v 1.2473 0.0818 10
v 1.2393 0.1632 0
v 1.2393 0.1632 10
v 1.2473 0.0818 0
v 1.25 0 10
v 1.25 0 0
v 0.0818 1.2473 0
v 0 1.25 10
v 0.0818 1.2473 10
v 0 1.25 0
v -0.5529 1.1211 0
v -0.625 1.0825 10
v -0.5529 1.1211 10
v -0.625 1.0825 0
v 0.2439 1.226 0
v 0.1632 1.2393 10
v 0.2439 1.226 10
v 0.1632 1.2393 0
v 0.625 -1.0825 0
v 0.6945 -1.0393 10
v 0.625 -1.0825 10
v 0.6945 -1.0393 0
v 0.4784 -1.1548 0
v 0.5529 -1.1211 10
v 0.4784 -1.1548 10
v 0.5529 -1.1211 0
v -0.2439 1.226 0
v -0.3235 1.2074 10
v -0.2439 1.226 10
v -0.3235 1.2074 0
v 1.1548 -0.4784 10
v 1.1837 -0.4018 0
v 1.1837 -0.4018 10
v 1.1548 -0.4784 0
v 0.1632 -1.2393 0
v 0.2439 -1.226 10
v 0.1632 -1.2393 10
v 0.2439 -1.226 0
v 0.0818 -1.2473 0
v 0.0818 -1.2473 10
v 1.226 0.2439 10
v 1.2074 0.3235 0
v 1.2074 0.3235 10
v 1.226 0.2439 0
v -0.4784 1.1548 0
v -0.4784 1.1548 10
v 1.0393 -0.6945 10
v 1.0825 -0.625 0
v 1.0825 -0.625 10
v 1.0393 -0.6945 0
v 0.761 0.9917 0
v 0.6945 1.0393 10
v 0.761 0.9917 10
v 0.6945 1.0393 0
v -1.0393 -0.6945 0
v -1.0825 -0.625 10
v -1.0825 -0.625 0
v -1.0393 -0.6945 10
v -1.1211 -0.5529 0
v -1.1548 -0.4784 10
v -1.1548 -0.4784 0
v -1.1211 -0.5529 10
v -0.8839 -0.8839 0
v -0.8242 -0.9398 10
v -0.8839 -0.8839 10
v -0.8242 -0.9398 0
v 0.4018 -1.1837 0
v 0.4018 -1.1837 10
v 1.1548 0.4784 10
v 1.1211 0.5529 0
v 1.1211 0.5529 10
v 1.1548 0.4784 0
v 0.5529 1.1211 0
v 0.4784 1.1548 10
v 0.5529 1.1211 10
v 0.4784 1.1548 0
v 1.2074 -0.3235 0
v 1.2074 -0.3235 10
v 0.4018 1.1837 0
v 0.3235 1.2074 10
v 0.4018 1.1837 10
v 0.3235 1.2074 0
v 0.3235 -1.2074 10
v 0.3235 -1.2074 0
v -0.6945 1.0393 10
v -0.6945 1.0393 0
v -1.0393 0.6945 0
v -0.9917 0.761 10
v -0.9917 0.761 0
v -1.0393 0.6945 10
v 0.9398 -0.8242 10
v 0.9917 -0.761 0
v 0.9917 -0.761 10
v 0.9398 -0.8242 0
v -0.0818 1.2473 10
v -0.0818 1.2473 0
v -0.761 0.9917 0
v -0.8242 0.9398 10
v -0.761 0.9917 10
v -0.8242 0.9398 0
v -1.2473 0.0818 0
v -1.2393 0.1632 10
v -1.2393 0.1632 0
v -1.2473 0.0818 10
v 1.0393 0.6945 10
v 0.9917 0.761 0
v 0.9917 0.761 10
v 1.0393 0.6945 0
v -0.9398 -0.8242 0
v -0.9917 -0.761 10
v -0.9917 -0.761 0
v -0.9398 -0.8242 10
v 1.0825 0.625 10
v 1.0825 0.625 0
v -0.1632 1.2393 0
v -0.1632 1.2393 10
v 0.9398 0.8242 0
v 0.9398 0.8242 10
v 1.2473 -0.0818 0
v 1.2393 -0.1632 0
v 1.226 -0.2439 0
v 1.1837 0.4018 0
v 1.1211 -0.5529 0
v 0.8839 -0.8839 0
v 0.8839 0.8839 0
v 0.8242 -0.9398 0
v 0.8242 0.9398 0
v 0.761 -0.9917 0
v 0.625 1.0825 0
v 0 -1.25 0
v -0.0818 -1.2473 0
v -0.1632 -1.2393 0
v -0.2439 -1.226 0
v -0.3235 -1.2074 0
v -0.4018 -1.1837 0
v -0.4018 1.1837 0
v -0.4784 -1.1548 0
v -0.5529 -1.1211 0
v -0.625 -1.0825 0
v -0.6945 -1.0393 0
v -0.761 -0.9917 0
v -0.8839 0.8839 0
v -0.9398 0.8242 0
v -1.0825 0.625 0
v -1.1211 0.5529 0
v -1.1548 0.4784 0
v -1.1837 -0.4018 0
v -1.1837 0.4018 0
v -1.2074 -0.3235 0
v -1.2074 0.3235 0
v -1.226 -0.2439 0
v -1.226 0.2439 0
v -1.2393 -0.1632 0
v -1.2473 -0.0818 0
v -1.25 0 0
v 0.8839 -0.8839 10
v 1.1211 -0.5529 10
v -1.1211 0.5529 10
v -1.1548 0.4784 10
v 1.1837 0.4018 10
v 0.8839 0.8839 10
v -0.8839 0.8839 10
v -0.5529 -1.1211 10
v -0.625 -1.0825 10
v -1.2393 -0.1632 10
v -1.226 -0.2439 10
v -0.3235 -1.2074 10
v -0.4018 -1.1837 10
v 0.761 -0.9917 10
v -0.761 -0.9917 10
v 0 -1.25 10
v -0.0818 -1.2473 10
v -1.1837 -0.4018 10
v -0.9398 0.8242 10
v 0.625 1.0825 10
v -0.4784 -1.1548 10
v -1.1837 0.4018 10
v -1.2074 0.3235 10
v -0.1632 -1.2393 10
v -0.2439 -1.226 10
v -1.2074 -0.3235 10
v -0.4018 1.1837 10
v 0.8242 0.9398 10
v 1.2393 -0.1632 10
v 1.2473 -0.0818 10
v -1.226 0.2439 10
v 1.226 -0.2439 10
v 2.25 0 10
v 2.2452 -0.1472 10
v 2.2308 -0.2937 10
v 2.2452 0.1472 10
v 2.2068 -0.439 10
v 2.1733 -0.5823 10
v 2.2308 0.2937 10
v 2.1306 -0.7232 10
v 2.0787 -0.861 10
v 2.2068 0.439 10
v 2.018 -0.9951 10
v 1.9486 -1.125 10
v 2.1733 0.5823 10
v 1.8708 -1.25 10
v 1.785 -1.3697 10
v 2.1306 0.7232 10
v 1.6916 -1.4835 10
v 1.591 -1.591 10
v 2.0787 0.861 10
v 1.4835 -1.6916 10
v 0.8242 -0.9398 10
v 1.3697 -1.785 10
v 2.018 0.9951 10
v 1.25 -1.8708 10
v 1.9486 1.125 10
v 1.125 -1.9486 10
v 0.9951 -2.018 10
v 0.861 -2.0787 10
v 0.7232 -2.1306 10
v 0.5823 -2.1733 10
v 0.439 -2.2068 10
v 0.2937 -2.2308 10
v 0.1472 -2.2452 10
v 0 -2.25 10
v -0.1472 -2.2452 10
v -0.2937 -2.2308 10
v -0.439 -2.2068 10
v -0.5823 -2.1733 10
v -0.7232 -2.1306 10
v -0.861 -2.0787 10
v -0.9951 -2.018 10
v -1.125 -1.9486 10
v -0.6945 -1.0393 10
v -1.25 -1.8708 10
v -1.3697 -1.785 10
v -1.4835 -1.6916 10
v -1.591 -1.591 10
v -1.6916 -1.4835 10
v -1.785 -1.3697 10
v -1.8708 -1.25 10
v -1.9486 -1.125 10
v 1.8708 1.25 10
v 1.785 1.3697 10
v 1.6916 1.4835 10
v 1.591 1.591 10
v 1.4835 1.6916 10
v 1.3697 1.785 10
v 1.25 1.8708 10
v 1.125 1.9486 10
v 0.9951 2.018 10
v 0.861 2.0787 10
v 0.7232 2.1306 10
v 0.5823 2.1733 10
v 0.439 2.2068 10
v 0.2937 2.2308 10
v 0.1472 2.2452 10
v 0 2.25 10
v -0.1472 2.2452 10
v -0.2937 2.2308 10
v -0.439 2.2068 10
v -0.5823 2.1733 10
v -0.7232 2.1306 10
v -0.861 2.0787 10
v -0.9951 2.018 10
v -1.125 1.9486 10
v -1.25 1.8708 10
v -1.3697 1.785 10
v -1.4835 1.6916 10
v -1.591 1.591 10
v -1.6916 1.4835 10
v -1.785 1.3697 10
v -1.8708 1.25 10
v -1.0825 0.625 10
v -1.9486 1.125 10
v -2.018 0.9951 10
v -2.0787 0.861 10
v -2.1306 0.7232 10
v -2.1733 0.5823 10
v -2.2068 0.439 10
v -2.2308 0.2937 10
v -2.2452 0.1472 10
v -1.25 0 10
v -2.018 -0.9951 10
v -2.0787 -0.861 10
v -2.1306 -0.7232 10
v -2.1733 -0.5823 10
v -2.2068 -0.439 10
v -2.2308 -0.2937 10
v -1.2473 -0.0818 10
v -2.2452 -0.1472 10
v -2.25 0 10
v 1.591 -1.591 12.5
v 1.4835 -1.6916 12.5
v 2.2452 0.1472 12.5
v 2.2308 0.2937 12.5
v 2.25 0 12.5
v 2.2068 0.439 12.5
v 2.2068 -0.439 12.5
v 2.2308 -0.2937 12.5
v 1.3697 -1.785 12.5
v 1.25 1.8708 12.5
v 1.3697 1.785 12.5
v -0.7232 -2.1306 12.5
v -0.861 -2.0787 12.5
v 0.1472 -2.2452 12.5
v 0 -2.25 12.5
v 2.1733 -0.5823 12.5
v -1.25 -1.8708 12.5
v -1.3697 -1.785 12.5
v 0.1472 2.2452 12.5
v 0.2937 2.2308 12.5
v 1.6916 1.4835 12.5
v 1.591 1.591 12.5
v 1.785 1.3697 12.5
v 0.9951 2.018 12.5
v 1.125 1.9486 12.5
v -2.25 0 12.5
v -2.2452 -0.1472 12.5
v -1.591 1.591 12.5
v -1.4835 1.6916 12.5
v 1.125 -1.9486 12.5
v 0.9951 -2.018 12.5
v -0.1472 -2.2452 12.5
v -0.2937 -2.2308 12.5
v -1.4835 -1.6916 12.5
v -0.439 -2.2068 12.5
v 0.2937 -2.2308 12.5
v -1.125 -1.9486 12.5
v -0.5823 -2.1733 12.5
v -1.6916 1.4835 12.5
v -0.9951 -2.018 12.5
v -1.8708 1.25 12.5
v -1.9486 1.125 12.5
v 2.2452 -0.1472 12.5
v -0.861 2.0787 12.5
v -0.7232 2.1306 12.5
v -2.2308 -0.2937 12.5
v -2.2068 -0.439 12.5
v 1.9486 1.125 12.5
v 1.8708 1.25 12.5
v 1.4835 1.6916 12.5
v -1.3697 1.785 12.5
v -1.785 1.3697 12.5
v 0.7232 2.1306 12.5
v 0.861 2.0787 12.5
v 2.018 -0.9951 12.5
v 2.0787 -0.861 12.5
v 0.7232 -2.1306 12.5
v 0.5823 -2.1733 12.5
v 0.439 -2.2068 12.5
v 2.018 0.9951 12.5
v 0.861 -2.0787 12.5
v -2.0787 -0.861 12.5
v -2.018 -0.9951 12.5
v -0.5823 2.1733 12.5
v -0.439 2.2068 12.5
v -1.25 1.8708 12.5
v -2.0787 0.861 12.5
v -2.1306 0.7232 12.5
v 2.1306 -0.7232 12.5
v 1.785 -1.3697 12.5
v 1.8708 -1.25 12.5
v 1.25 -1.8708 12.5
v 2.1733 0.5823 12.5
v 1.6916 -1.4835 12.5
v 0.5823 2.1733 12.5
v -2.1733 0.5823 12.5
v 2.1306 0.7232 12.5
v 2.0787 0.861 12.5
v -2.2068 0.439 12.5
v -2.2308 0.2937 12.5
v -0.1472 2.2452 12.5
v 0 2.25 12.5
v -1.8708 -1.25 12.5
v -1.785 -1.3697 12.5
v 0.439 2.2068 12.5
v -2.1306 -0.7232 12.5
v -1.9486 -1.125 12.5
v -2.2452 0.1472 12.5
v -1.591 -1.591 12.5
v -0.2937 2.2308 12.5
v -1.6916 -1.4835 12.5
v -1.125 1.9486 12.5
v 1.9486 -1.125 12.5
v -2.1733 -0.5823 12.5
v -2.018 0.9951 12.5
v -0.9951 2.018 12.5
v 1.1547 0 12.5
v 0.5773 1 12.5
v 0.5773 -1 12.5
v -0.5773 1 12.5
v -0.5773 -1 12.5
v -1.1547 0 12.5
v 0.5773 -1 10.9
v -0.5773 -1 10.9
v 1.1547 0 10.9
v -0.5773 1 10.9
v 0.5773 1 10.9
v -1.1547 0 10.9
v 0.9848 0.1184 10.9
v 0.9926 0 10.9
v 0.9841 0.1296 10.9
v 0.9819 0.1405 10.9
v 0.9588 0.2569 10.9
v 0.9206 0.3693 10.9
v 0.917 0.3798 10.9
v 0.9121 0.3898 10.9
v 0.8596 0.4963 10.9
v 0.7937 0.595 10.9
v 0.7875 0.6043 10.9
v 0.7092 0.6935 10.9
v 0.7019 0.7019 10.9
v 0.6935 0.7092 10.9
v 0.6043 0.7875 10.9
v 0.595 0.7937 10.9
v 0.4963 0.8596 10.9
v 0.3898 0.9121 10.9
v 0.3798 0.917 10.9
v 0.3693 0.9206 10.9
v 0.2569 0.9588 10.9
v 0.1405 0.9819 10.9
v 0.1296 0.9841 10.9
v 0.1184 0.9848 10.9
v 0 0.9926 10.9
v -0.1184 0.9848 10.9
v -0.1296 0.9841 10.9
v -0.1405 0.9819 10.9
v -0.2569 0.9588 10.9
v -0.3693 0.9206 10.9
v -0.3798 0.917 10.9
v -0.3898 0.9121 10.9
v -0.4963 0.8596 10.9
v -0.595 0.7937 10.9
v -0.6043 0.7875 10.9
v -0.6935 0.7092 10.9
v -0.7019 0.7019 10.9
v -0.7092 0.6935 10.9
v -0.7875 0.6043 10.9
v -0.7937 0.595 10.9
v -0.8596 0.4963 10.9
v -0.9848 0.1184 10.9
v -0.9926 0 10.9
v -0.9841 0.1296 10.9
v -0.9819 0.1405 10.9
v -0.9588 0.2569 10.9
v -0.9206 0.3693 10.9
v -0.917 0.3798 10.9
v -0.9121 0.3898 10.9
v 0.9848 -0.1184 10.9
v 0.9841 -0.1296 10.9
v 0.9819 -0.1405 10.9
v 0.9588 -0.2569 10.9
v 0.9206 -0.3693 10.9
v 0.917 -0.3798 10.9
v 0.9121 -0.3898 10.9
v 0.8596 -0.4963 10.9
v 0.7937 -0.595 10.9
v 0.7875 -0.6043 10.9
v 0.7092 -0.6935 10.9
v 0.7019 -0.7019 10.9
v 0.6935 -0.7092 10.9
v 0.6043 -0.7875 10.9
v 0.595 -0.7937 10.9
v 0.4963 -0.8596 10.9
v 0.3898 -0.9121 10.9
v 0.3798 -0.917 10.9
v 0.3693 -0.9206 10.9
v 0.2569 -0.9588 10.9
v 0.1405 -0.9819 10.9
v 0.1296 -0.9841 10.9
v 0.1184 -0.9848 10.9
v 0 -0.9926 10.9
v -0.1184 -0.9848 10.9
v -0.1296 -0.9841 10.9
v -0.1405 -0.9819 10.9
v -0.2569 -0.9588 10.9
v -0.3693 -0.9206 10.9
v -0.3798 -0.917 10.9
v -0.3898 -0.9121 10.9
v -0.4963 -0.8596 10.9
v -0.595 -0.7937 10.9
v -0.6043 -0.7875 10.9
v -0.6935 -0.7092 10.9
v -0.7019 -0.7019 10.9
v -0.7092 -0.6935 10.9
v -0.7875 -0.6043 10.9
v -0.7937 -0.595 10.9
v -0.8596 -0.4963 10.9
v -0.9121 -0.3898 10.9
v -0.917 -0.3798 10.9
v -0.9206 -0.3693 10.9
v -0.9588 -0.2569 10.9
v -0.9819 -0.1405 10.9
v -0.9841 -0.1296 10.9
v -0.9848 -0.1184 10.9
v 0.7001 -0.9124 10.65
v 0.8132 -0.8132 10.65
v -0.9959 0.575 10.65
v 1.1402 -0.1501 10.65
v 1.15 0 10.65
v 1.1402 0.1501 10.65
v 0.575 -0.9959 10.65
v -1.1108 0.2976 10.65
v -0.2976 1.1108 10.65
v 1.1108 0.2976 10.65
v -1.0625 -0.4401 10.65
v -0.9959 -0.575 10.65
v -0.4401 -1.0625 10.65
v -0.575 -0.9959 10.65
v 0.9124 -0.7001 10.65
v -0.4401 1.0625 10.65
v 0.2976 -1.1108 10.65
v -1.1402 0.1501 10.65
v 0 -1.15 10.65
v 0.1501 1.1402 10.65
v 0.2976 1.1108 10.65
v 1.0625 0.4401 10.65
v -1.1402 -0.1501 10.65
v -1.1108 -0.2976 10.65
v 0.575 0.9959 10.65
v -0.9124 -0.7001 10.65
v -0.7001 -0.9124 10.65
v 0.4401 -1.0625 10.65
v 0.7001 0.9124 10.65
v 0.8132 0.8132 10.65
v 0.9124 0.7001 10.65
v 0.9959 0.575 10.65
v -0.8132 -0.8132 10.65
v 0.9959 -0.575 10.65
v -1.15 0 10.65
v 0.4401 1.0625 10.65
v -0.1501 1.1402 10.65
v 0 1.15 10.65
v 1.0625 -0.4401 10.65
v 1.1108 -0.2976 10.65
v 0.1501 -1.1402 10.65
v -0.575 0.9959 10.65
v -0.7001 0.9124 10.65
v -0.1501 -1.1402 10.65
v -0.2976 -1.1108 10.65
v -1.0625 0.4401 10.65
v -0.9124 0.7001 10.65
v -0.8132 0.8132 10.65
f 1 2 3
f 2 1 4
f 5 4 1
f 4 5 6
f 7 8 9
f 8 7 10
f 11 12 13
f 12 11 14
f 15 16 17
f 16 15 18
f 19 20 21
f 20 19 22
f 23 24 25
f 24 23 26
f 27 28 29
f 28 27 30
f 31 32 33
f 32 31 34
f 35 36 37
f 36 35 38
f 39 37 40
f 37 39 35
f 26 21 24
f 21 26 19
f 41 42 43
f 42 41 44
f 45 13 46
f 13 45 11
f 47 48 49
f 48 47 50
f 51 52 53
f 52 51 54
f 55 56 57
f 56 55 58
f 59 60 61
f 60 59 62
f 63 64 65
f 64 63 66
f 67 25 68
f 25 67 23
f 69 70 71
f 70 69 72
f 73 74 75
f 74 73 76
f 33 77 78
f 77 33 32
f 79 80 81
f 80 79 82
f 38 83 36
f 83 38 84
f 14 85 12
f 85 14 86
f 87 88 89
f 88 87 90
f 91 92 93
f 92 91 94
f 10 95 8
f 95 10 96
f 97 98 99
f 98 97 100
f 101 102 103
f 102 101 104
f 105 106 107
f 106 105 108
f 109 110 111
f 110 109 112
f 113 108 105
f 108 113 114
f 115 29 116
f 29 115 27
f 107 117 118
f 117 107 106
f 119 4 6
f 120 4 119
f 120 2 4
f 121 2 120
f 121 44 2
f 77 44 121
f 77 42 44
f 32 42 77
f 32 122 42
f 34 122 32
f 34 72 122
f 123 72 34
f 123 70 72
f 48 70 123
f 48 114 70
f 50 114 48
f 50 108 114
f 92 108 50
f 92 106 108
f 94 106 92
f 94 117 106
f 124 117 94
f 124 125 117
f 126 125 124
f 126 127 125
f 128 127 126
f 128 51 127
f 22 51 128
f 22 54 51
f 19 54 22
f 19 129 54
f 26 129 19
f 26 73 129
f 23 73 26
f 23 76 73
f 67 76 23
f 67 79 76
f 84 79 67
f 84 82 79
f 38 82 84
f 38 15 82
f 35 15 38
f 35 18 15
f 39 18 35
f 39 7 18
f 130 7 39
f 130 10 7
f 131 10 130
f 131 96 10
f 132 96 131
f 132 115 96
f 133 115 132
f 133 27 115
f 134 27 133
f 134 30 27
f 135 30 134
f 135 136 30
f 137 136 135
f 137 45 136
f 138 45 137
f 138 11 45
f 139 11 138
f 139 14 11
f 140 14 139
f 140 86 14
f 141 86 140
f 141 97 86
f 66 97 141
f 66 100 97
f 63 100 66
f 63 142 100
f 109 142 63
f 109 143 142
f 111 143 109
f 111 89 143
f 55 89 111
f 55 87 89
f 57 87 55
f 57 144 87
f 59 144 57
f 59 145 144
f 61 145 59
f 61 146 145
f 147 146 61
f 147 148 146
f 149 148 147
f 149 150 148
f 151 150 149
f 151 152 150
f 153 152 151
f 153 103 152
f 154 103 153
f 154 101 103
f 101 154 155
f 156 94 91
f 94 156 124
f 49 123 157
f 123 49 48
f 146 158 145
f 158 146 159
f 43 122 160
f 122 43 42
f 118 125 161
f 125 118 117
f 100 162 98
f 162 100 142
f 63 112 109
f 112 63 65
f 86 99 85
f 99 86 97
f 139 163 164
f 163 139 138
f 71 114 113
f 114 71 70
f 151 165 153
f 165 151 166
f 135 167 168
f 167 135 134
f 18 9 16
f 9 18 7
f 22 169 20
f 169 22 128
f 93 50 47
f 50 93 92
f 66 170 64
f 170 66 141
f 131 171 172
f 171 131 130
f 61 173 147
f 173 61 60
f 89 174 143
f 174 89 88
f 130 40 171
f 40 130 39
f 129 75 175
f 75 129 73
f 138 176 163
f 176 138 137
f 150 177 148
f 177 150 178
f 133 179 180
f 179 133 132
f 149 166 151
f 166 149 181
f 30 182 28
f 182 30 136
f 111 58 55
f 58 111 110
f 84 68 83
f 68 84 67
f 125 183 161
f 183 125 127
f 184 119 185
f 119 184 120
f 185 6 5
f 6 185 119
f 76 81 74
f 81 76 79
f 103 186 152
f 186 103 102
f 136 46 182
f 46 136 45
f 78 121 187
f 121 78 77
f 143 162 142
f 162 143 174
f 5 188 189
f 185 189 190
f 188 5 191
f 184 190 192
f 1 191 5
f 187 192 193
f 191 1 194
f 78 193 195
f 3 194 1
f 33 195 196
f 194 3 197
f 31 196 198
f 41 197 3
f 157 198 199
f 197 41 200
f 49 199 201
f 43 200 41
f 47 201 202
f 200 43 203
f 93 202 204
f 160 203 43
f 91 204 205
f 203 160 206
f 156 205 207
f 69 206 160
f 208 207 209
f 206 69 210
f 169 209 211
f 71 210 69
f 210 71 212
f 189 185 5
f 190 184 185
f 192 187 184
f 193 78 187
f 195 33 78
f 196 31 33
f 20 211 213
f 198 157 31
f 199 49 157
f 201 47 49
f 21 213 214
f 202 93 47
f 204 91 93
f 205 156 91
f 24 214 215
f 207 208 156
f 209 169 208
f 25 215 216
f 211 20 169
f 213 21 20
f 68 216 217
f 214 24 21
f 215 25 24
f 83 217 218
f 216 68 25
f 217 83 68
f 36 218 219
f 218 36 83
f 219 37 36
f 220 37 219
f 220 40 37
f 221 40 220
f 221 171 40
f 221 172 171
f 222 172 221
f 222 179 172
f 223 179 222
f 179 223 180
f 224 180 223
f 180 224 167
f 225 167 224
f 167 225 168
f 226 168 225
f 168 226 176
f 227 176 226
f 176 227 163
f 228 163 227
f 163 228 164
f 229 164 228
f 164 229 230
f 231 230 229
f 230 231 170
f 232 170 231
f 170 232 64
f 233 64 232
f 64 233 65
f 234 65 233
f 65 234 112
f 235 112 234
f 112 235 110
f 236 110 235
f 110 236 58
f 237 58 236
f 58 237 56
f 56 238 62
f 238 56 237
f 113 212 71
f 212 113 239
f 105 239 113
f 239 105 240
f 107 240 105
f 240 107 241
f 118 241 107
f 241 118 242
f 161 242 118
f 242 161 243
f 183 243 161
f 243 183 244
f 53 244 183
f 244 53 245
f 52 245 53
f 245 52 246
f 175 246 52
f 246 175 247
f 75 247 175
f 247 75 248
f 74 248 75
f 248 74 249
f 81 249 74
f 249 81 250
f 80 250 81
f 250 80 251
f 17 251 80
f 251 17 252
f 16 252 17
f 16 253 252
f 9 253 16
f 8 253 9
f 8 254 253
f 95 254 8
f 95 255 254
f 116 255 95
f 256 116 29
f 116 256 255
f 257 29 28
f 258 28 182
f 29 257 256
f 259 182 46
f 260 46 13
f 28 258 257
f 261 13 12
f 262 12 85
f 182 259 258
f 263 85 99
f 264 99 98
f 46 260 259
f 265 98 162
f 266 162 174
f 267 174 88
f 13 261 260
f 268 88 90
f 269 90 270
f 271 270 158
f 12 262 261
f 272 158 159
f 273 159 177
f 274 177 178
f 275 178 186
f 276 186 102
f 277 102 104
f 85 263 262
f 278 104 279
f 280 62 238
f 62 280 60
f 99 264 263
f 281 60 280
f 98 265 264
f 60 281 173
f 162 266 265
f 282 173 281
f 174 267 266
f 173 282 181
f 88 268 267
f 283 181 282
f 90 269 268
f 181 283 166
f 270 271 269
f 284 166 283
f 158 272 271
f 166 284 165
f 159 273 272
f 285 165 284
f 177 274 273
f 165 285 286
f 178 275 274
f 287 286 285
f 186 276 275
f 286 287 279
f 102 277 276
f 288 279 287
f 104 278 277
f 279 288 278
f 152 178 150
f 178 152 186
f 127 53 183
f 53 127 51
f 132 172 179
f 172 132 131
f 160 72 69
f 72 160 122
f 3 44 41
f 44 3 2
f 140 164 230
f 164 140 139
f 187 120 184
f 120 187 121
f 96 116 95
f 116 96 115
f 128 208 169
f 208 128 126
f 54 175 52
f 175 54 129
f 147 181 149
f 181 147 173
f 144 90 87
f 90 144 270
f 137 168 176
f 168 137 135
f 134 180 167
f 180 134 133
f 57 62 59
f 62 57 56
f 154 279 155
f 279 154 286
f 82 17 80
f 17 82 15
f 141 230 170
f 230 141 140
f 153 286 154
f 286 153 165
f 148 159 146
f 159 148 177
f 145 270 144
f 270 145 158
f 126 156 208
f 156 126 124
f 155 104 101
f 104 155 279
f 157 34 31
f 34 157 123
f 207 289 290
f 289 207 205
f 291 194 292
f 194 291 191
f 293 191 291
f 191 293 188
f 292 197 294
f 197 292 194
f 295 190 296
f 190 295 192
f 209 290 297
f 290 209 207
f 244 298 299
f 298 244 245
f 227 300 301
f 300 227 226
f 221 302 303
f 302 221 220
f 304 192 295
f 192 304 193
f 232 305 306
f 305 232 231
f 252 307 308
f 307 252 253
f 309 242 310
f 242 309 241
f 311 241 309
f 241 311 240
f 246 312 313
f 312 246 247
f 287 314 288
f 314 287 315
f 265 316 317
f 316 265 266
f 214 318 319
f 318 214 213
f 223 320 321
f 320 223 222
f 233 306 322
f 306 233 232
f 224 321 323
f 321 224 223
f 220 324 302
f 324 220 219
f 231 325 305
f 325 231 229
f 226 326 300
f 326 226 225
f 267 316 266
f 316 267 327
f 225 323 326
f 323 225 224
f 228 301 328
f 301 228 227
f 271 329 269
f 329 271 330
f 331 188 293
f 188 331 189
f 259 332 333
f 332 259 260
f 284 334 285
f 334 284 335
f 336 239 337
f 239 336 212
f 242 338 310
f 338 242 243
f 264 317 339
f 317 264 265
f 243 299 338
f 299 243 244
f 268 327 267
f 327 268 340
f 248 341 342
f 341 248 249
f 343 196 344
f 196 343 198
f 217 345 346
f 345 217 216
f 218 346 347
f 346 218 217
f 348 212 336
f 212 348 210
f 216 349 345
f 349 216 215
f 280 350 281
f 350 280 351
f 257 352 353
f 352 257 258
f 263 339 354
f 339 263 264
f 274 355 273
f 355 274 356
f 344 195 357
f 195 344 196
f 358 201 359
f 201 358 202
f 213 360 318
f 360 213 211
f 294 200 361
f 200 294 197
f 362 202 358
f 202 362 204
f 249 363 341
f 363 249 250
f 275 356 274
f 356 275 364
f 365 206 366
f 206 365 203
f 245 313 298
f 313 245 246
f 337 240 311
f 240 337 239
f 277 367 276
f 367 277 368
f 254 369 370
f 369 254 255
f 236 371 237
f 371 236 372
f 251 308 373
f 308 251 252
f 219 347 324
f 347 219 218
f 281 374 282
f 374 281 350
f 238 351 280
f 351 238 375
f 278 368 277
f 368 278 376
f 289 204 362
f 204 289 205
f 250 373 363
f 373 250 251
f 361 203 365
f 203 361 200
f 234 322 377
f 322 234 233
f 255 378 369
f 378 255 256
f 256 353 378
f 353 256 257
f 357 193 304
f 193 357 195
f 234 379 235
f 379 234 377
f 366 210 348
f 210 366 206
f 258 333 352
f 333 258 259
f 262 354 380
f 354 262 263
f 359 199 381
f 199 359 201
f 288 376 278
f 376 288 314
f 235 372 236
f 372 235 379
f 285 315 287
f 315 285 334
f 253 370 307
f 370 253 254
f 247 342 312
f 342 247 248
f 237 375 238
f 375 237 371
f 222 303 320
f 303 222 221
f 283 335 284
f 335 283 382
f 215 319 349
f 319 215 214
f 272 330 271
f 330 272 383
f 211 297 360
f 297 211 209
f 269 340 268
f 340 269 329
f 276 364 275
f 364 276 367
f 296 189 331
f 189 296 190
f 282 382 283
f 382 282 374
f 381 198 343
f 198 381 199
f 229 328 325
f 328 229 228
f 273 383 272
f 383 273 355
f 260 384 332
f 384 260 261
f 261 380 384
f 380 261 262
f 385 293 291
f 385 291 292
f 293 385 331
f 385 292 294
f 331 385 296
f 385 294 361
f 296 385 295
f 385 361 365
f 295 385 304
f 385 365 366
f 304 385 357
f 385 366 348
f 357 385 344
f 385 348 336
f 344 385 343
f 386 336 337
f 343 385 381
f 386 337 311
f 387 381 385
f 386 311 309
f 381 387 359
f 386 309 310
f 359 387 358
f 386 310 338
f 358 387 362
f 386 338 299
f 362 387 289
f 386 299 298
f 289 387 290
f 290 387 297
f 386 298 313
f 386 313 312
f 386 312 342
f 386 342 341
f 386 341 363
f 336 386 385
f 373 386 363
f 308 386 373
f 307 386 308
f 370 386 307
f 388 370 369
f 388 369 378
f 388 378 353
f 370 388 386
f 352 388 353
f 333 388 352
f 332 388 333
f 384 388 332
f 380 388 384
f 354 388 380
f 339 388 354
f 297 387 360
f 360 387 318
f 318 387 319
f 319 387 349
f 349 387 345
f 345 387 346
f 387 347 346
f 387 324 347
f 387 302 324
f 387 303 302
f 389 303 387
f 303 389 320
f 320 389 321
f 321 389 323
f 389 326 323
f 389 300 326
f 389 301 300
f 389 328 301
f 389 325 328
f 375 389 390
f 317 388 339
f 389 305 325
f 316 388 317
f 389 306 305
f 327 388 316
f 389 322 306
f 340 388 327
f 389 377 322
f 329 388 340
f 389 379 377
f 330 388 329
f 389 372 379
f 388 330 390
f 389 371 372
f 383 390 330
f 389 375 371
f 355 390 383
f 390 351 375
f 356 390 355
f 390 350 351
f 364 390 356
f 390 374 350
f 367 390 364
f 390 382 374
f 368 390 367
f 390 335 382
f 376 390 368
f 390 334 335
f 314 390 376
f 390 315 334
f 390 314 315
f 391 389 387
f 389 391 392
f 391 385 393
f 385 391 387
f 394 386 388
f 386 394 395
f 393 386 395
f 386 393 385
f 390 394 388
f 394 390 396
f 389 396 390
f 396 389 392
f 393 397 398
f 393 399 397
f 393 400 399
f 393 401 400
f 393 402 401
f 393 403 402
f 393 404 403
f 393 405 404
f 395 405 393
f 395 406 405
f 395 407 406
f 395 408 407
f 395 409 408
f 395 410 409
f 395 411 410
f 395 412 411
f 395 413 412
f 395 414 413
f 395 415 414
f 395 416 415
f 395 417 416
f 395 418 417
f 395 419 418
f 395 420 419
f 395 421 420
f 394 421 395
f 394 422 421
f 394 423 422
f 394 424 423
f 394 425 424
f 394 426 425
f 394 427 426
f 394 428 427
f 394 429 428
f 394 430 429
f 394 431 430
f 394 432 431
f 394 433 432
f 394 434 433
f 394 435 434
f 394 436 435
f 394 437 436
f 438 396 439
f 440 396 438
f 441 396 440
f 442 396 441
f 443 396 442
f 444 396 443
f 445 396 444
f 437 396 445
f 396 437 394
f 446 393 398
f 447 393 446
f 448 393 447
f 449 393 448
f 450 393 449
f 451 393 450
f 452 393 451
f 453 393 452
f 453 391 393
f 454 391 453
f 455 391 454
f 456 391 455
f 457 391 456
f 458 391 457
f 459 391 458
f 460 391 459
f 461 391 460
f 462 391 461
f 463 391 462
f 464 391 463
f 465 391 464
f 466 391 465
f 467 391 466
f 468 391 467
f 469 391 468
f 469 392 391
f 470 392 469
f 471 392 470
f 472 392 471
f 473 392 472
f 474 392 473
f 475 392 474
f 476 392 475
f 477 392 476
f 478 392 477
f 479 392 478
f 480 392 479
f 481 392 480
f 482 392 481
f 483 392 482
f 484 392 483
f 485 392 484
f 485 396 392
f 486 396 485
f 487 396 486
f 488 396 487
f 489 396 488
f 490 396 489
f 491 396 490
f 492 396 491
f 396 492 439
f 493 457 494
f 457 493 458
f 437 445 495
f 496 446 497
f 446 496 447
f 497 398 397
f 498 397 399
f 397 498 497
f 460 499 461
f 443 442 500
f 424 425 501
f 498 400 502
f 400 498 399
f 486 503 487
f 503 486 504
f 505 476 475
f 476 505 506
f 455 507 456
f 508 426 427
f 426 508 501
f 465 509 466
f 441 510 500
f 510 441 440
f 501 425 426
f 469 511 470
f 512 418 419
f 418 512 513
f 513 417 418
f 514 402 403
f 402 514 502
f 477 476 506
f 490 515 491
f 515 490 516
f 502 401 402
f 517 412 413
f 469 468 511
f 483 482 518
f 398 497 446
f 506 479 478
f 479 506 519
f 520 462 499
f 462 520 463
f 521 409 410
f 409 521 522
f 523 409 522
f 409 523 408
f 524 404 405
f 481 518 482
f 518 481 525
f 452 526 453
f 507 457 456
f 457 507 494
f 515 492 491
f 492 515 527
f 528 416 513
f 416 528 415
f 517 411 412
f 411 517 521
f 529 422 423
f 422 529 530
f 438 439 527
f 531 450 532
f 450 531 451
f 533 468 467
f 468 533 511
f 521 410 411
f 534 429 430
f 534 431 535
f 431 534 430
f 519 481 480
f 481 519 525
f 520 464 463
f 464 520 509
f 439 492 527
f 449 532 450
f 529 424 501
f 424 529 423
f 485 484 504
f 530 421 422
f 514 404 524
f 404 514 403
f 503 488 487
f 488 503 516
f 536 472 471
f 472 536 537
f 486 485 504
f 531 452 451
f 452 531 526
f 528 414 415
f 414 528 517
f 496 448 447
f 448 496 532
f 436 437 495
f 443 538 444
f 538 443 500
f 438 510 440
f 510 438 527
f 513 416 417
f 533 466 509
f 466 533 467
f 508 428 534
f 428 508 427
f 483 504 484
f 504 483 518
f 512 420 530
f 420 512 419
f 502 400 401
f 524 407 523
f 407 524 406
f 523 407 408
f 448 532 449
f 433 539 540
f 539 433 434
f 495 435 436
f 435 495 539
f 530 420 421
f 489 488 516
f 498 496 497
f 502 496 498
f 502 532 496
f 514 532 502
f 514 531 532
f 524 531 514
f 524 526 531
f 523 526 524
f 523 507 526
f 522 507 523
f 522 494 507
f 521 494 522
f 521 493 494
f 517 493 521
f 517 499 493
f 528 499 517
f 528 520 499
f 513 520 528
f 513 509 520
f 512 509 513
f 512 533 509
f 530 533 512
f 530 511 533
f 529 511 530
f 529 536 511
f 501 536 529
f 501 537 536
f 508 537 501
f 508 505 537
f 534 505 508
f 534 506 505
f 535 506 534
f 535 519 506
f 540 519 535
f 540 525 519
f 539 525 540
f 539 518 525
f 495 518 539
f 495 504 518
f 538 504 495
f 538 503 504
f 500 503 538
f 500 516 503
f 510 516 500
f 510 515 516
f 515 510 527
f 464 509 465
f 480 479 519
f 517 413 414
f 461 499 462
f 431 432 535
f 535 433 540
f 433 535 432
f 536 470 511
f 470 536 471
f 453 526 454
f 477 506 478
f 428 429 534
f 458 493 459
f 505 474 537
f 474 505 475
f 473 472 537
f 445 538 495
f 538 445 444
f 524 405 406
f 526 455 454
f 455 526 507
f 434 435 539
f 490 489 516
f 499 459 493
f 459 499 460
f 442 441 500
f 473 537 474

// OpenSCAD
$fn = 96;

// Dimensions (mm)
shaft_d = 2.5;
length  = 10;

head_d  = 4.5;
head_h  = 2.5;

// Approximate hex socket dimensions for an M2.5 SHCS
socket_af = 2.0;   // across flats
socket_depth = 1.6;
socket_entry_chamfer = 0.25;

module hex_prism(af, h) {
    // Regular hex with across-flats = af
    r = af / sqrt(3); // circumradius
    cylinder(h = h, r = r, $fn = 6);
}

difference() {
    union() {
        // Shaft
        cylinder(h = length, d = shaft_d);

        // Head
        translate([0,0,length])
            cylinder(h = head_h, d = head_d);
    }

    // Hex socket cut
    translate([0,0,length + head_h - socket_depth])
        hex_prism(socket_af, socket_depth + 0.02);

    // Small entry chamfer to the socket
    translate([0,0,length + head_h - socket_depth - socket_entry_chamfer])
        cylinder(h = socket_entry_chamfer + 0.02, d1 = socket_af * 1.15, d2 = socket_af * 0.98, $fn = 48);
}
